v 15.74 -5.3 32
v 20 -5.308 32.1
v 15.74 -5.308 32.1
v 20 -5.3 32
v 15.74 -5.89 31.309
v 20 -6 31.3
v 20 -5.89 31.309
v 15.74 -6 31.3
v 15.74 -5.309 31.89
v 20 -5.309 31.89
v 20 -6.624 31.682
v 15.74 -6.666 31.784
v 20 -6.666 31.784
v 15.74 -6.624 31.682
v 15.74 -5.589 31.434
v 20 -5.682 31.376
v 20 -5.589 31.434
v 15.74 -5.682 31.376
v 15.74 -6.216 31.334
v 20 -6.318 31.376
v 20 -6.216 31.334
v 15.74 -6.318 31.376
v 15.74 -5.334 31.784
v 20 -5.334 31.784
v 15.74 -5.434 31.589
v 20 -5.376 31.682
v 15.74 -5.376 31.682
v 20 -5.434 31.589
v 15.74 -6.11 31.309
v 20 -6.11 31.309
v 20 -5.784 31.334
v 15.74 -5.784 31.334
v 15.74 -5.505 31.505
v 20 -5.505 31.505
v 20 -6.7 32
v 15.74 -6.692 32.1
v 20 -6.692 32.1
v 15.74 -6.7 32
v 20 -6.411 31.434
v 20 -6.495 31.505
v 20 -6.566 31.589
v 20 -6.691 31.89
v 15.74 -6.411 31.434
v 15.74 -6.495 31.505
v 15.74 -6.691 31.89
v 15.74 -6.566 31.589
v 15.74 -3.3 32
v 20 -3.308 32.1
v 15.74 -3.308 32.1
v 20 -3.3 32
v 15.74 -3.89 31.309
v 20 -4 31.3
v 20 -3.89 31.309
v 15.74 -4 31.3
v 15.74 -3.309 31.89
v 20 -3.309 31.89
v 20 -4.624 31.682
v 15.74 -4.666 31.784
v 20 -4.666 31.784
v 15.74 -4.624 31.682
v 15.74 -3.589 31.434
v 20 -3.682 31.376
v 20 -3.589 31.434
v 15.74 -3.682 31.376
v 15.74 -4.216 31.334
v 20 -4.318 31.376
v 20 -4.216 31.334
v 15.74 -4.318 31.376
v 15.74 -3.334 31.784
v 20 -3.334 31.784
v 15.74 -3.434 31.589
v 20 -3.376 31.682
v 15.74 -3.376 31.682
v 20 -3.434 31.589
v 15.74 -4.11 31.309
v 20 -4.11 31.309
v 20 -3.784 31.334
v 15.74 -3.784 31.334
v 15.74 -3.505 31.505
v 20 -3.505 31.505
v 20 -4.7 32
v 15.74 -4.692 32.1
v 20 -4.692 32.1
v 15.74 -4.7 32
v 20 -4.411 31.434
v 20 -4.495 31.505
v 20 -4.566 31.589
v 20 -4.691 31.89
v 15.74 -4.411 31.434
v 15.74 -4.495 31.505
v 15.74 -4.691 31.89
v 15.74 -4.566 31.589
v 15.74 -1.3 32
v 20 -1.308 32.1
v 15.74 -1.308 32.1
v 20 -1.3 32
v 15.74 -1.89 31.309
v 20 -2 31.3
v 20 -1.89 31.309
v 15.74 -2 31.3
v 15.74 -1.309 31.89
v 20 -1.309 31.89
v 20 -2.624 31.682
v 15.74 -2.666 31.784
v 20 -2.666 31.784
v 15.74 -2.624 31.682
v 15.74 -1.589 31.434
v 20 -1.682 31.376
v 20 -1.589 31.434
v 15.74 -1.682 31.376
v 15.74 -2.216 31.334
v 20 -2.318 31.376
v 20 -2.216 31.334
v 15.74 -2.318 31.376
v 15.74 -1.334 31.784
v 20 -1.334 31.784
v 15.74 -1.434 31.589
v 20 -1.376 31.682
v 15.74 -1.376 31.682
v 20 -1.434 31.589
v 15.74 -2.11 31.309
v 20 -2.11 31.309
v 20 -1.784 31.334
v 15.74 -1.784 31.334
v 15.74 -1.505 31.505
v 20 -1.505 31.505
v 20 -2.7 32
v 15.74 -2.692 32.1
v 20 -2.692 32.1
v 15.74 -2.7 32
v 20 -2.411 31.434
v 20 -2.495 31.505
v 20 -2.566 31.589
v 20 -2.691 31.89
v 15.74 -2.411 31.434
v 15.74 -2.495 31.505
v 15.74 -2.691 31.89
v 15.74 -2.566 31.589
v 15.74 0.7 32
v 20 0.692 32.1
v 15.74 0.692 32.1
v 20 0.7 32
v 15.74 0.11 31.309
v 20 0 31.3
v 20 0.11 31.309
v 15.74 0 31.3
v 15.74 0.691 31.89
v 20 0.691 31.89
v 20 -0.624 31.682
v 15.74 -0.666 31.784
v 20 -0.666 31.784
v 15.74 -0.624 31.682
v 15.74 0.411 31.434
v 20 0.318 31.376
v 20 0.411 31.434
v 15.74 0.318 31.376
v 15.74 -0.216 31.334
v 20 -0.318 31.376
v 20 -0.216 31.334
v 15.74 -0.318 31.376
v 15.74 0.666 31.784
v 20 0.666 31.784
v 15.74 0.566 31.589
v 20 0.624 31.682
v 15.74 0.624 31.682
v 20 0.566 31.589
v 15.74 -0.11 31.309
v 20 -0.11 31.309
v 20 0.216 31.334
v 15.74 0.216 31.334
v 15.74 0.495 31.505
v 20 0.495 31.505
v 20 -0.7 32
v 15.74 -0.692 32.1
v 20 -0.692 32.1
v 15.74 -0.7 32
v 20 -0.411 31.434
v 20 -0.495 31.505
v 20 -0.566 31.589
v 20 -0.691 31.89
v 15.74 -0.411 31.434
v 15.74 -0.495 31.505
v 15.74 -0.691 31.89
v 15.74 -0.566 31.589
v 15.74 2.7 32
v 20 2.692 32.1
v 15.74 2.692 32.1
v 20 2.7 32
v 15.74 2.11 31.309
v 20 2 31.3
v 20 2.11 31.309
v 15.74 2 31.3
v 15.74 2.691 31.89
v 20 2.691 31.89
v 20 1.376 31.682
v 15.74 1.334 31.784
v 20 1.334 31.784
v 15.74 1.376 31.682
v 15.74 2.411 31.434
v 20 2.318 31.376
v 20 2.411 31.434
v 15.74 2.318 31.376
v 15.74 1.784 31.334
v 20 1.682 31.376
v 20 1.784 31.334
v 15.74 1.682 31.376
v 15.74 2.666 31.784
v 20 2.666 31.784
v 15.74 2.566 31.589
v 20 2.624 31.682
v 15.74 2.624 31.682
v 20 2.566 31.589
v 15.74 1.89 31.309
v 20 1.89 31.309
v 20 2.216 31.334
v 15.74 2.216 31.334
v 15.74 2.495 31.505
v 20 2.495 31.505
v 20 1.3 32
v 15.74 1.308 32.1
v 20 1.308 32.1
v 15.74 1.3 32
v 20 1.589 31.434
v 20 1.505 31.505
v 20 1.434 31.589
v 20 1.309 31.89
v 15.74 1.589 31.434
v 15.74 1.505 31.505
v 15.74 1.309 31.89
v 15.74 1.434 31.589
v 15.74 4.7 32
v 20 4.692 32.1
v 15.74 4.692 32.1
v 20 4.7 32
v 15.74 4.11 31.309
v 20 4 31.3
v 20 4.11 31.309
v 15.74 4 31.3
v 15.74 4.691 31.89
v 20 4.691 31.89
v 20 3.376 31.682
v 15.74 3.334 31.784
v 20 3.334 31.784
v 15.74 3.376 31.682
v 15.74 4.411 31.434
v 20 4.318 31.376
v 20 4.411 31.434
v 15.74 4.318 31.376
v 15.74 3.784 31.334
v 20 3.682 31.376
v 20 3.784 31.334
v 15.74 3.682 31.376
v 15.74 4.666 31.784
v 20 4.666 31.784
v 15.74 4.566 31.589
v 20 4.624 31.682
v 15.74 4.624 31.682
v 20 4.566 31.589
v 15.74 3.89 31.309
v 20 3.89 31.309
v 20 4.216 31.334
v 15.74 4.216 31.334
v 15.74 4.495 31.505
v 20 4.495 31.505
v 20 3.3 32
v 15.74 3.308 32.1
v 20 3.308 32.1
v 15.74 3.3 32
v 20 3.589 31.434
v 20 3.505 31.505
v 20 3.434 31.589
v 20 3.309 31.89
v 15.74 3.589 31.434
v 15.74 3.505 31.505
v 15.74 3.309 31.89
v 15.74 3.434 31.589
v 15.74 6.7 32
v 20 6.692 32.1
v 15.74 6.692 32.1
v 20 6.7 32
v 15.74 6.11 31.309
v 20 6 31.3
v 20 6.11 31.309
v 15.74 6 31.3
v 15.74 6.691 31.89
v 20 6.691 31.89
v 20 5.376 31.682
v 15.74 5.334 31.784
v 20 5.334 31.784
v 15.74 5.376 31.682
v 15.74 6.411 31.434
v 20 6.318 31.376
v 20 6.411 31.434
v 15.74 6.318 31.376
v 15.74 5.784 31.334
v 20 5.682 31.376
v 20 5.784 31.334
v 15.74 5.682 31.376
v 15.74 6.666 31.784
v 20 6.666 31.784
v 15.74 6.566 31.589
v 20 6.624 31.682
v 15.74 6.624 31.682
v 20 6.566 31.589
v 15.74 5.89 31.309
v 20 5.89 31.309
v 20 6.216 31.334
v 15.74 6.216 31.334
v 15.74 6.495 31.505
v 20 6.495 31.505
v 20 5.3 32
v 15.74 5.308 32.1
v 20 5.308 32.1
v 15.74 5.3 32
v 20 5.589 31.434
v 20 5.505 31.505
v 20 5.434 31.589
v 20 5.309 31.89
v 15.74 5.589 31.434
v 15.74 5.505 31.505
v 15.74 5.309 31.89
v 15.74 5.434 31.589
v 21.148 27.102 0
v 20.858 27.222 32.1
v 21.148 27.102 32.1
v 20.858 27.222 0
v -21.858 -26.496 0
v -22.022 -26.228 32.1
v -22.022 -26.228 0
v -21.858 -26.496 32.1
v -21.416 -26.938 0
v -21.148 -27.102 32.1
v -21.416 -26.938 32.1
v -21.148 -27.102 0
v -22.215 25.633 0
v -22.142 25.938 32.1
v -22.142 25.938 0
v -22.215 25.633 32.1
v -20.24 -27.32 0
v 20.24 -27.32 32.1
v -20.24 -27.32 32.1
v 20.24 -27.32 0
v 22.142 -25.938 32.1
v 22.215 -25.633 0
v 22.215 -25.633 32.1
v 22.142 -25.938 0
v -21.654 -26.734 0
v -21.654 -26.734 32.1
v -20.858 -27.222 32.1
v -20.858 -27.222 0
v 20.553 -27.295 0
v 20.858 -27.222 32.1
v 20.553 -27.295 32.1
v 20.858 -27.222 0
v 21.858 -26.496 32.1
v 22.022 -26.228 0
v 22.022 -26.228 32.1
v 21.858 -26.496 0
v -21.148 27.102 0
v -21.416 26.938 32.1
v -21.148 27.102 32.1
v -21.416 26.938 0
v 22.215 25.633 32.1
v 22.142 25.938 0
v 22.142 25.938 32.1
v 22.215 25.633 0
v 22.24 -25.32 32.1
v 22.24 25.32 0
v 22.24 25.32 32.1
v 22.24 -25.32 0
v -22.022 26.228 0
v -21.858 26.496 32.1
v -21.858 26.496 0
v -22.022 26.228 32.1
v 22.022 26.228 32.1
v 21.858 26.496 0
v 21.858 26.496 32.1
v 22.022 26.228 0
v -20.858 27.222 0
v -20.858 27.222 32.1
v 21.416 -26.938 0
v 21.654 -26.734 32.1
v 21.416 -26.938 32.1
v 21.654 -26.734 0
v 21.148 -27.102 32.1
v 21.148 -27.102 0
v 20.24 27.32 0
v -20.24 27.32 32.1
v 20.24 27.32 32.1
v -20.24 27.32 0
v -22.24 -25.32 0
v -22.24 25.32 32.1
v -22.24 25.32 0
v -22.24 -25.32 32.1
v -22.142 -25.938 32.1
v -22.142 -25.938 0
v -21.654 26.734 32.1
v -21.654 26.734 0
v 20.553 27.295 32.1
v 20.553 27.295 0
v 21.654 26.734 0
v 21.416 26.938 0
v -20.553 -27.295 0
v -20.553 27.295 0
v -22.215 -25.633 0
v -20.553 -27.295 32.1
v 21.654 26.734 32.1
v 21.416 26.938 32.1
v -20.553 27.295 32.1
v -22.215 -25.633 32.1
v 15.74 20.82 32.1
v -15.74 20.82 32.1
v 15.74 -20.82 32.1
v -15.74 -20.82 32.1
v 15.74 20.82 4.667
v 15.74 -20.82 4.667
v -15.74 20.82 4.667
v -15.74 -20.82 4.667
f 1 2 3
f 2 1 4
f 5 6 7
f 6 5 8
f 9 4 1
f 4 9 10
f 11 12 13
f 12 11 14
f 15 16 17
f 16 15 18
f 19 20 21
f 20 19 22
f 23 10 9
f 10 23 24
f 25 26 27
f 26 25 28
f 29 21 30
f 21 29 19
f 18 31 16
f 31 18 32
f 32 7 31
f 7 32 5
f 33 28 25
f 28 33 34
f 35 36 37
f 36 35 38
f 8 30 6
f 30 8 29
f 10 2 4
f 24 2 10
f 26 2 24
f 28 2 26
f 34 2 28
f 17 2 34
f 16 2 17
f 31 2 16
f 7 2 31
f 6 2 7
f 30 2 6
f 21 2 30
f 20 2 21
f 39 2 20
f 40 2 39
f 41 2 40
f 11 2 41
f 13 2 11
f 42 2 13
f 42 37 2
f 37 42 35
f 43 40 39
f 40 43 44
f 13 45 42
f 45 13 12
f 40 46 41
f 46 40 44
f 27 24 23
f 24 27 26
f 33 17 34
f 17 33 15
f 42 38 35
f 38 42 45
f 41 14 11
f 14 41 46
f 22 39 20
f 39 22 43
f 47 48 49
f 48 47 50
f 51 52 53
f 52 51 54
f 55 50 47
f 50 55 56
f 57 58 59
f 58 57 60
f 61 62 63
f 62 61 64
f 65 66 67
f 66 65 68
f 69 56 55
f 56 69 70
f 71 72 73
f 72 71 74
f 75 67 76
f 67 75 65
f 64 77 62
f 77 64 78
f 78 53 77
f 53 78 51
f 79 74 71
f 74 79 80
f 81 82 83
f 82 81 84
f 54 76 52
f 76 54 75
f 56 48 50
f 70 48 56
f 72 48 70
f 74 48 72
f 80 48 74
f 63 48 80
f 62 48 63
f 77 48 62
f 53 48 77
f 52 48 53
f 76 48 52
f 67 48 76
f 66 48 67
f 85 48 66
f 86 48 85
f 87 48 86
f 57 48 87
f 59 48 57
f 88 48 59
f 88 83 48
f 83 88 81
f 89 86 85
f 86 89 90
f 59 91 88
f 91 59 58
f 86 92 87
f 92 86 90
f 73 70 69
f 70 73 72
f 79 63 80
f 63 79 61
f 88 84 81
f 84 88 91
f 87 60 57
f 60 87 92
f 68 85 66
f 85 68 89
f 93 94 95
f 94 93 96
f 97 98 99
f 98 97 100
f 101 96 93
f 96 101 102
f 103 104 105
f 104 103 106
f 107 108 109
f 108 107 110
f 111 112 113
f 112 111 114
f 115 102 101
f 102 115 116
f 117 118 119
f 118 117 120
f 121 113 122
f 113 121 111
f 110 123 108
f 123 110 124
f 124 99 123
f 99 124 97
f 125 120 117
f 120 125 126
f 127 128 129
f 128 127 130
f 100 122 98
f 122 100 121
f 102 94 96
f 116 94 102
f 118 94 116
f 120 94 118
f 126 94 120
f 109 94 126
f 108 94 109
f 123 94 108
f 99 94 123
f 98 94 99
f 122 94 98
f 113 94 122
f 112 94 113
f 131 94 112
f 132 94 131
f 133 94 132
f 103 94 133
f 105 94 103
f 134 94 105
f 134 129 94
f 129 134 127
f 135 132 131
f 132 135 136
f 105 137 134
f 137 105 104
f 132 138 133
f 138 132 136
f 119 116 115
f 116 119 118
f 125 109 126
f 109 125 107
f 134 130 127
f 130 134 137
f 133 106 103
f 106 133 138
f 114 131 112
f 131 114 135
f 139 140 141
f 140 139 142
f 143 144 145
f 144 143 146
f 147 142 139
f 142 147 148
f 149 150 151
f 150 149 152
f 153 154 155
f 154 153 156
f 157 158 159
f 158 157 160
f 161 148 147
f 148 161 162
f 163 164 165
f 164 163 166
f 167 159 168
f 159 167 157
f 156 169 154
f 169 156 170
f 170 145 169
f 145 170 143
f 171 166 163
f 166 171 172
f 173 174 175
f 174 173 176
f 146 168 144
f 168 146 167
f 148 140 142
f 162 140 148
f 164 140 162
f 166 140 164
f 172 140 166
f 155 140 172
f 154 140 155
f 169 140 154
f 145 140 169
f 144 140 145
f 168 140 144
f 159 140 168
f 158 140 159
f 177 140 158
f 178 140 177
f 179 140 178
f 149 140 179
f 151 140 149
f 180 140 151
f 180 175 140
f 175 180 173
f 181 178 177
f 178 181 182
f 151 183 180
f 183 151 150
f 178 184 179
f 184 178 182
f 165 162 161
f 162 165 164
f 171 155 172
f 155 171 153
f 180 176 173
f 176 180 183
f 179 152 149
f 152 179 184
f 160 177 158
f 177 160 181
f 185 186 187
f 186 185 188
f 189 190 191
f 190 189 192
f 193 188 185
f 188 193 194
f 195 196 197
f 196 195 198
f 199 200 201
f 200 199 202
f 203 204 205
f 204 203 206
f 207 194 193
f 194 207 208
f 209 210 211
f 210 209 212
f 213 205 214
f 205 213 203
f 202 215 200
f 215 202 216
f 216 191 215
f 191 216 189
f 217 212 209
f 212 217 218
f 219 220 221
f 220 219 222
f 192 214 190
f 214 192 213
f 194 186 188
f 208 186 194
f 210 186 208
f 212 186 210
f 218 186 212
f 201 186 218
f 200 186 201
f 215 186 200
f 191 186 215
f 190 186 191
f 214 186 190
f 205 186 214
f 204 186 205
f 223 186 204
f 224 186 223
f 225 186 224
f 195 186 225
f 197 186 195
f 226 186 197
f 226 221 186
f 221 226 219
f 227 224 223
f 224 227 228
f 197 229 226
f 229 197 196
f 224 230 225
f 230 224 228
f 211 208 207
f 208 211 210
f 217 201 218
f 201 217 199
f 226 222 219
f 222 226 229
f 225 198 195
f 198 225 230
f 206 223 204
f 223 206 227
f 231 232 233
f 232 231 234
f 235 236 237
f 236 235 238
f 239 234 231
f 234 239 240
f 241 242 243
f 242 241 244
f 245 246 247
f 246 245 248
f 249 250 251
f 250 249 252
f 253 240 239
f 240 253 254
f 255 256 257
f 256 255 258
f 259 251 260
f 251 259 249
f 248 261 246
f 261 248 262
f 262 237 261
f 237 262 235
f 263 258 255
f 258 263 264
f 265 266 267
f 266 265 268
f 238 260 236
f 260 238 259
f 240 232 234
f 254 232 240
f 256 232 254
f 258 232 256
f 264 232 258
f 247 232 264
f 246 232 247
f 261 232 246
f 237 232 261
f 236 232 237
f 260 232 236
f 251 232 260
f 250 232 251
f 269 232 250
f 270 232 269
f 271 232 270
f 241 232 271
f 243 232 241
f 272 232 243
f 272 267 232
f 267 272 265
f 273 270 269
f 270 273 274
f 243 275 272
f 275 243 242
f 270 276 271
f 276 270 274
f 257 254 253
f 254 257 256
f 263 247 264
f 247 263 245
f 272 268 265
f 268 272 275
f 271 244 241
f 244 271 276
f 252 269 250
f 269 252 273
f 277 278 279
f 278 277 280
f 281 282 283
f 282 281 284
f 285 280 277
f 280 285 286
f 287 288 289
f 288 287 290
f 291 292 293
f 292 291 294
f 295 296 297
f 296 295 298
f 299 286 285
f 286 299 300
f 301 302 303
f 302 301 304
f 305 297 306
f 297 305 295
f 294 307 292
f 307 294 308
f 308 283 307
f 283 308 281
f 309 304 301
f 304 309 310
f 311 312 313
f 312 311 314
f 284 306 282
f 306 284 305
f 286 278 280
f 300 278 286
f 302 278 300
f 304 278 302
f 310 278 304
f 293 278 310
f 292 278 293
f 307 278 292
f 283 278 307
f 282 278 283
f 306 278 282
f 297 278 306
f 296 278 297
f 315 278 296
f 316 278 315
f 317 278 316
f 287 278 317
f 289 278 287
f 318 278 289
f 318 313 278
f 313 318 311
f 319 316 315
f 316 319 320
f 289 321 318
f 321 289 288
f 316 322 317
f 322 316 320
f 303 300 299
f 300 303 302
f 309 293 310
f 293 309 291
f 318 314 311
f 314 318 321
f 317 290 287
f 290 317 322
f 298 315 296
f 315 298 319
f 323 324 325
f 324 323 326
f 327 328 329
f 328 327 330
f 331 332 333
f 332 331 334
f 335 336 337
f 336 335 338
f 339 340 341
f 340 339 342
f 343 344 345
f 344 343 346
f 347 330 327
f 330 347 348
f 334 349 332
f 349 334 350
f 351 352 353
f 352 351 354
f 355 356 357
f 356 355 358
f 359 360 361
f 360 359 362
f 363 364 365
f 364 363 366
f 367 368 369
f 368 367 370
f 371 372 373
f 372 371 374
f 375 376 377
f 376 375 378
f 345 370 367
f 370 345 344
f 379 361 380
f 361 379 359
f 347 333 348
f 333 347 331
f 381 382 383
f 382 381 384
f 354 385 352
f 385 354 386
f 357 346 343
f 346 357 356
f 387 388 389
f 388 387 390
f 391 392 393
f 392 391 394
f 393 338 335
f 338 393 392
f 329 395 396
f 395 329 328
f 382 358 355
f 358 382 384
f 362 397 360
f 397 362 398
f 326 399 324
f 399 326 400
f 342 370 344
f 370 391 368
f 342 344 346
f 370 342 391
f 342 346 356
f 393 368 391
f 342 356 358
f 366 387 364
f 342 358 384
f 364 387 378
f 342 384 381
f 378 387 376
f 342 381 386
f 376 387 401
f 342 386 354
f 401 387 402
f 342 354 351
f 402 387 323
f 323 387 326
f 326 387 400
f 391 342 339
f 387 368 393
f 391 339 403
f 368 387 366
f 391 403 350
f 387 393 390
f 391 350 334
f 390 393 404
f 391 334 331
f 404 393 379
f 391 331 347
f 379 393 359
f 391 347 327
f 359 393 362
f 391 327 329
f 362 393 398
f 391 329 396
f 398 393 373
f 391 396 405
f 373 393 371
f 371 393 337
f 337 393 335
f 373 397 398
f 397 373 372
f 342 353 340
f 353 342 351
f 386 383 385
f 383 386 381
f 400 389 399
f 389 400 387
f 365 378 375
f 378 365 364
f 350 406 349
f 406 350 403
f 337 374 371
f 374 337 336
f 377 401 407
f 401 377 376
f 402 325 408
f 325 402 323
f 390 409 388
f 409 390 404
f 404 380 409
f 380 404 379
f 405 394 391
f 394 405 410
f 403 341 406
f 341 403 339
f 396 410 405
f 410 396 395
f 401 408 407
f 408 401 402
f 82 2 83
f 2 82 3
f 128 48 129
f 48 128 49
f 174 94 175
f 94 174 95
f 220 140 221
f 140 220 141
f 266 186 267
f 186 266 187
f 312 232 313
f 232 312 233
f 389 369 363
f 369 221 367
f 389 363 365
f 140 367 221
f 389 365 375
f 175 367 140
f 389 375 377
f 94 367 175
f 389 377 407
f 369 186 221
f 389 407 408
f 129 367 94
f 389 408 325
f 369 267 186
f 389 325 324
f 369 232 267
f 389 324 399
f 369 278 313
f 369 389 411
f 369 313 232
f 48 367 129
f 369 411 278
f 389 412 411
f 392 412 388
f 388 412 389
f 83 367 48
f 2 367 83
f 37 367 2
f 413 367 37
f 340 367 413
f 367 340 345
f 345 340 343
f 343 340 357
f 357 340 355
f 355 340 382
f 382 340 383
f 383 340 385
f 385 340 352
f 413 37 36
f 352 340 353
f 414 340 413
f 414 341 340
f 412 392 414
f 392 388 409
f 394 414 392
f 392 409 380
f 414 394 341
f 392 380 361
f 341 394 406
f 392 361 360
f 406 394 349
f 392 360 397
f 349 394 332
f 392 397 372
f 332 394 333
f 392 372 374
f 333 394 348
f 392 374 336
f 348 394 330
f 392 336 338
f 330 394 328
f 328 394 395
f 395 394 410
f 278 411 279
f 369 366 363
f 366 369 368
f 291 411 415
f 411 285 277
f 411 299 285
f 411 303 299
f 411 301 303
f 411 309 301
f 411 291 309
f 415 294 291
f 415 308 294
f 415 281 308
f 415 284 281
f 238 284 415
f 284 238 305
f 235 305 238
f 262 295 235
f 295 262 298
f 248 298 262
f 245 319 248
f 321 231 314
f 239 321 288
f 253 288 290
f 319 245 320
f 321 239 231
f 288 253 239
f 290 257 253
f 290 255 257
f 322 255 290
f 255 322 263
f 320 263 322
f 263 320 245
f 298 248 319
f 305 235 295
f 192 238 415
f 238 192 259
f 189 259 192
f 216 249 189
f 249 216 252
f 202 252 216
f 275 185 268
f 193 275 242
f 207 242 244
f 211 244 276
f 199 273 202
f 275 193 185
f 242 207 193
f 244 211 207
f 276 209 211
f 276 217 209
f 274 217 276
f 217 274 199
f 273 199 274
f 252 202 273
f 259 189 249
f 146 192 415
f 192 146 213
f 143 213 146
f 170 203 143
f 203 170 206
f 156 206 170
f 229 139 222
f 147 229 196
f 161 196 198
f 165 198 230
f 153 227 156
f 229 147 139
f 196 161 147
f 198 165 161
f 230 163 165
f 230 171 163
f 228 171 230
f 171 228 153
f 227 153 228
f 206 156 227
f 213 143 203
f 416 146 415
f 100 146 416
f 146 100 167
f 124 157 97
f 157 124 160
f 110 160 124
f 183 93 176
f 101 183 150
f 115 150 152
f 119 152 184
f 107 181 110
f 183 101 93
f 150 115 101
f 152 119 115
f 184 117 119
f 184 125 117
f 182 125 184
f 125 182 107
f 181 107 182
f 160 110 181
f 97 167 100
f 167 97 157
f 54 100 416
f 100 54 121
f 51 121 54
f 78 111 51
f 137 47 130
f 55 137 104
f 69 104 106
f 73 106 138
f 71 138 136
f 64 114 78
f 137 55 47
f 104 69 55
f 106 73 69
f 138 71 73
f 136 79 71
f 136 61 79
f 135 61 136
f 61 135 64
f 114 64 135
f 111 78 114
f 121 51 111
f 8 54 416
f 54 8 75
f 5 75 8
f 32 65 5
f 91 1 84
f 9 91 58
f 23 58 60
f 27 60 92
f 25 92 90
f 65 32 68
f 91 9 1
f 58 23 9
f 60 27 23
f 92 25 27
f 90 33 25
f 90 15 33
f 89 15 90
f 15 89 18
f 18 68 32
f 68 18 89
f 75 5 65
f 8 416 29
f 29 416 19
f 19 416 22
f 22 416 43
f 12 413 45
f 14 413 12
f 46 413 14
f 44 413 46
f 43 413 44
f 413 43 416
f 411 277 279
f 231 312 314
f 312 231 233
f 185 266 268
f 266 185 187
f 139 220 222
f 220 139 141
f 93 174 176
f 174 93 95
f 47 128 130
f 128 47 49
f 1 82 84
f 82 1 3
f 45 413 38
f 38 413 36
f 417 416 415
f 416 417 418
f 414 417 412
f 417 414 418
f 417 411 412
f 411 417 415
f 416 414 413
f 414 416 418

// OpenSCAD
// file: ../configuration.scad
$fn=40; // model faces resolution.

//OBECNE PARAMETRY 
//----------------------------------------------------------------
//----------------------------------------------------------------

vyska_krystalu=15;
vyska_sipm=2;
presah_krystalu=6;
rezerva_nad_krystalem=5;
vyska_drzaku_krystalu=vyska_krystalu-presah_krystalu-2;

hrana_krystalu=6; //čistá hrana

// big-big
//zakladna_krystalu_x=23.7; //1.5mm rezerva hrana SIPM je 22 mm
//zakladna_krystalu_y=23.7;
// big-small
zakladna_krystalu_x=22.0; //1.5mm rezerva hrana SIPM je 22 mm
zakladna_krystalu_y=22.0;
sila_steny=1.2;
sila_materialu_zakladny=7; //1.6;


vyska_zapusti_pro_PCB=0; //výčka krycího matriálu pro PCB a zároveň pro vytvoření vany pro zalití silikonem, kvůli světlotěsnoti.
vyska_SIPM_nad_PCB=2.4; //výška celého SIPM senzoru
tolerance_pro_dotazeni_k_SIPM=-0.5; // kvůli dotažení krystalu k SIPM
velikost_modulu_x=2; //počet der
velikost_modulu_y=4;
rotec_der_modulu=10.16;

vyska_matky=3;
sirka_matky=6.7;
prumer_sroubu=3.6;//3.4;
prumer_hlavy_sroubu=6;
vyska_hlavy_sroubu=5;

//Pro díl SIPMBOX01C_D02
D02_velikost_modulu_x=3; //počet der
D02_velikost_modulu_y=4;
D02_vyska_bocniho_prekryvu=25;

//Pro díl SIPMBOX01C_D07
D07_vyska=6;
// main file
include <../configuration.scad>
 
/*
difference (){
SIPMBOX01C_D05();
 
translate([-(hrana_krystalu)/2,-(hrana_krystalu)/2,0])
         
   cube([100,100,100]);   
    
}
*/

/*
difference (){
      union() {
translate([0,0,7])
          
          translate([-rotec_der_modulu/2,0,0])
          SIPMBOX01C_D01();
          
         
SIPMBOX01C_D02();

translate([-rotec_der_modulu/2,0,0])
SIPMBOX01C_D06();


SIPMBOX01C_D07();
 
 
translate([-10/2,-(D02_velikost_modulu_y+2)*rotec_der_modulu/2,sila_materialu_zakladny+vyska_krystalu+rezerva_nad_krystalem])          
SIPMBOX01C_D08();          
          

translate([-rotec_der_modulu/2,0,0])
SIPMBOX01C_D03();

translate([-(hrana_krystalu)/2,-(hrana_krystalu)/2,0])
cube([hrana_krystalu,hrana_krystalu,vyska_krystalu+vyska_sipm]);
          }
   cube([100,100,100]);       
          
          }

//*/



// SIPMBOX01C_D01();

//SIPMBOX01C_D06();

SIPMBOX01C_D02();


 

module SIPMBOX01C_D08()
{
  vyska_sloupku=3;
   difference () 
    {
   union()       {   
    cube([10,(D02_velikost_modulu_y+2)*rotec_der_modulu,2],center=false); 
        translate([10/2,0,0]) 
        cylinder (h = 3, r= 10/2, $fn=20);
        
     translate([10/2,(D02_velikost_modulu_y+2)*rotec_der_modulu,0]) 
        cylinder (h = 3, r= 10/2, $fn=20);
    }
    
     translate([10/2,0,-0.01]) 
            cylinder (h = vyska_sloupku+1, r= (prumer_sroubu+0.2)/2, $fn=40);
    
     translate([10/2,(D02_velikost_modulu_y+2)*rotec_der_modulu,-0.01]) 
            cylinder (h = vyska_sloupku+1, r= (prumer_sroubu+0.2)/2, $fn=40);
    
    
    }
    
    
       
}





module SIPMBOX01C_D07() //drzak na ALBASE
{
  difference (){
      union() {
 //Zakladna
 translate([-((D02_velikost_modulu_x) * rotec_der_modulu+2*sila_materialu_zakladny)/2,-((D02_velikost_modulu_y+2) * rotec_der_modulu+2*sila_materialu_zakladny)/2,0])
 
 minkowski()
{
  cube([(D02_velikost_modulu_x) * rotec_der_modulu+2*sila_materialu_zakladny,(D02_velikost_modulu_y+2) * rotec_der_modulu+2*sila_materialu_zakladny,D07_vyska]);
  cylinder(r=2,h=0.1);
}







}

//otvor na cely scintilacni detektor 
translate([-(D02_velikost_modulu_x * rotec_der_modulu+2*sila_materialu_zakladny)/2+2-1,-(D02_velikost_modulu_y * rotec_der_modulu+2*sila_materialu_zakladny)/2+2-1,0])
 
 minkowski()
{
  cube([D02_velikost_modulu_x * rotec_der_modulu-2*2+2+2*sila_materialu_zakladny,D02_velikost_modulu_y * rotec_der_modulu-2*2+2+2*sila_materialu_zakladny,D07_vyska]);
  cylinder(r=2,h=0.1);
}


//otvor na sroub 1
translate([-(D02_velikost_modulu_x-1)*rotec_der_modulu/2,(D02_velikost_modulu_y+2)*rotec_der_modulu/2,-0.01]) 
    translate([0,0,-0.01]) 
        {
        cylinder (h = D07_vyska+0.12, r= (prumer_sroubu+0.2)/2, $fn=40);
    
        cylinder (h = vyska_matky, r= (sirka_matky+0.2)/2, $fn=6);
      
        }

//otvor na sroub 2
translate([(D02_velikost_modulu_x-1)*rotec_der_modulu/2,(D02_velikost_modulu_y+2)*rotec_der_modulu/2,-0.01]) 
    translate([0,0,-0.01]) 
        {
        cylinder (h = D07_vyska+0.12, r= (prumer_sroubu+0.2)/2, $fn=40);
    
        cylinder (h = vyska_matky, r= (sirka_matky+0.2)/2, $fn=6);
      
        }

//otvor na sroub 3
translate([-(D02_velikost_modulu_x-1)*rotec_der_modulu/2,-(D02_velikost_modulu_y+2)*rotec_der_modulu/2,-0.01]) 
    translate([0,0,-0.01]) 
        {
        cylinder (h = D07_vyska+0.12, r= (prumer_sroubu+0.2)/2, $fn=40);
    
        cylinder (h = vyska_matky, r= (sirka_matky+0.2)/2, $fn=6);
      
        }

//otvor na sroub 4
translate([(D02_velikost_modulu_x-1)*rotec_der_modulu/2,-(D02_velikost_modulu_y+2)*rotec_der_modulu/2,-0.01]) 
    translate([0,0,-0.01]) 
        {
        cylinder (h = D07_vyska+0.12, r= (prumer_sroubu+0.2)/2, $fn=40);
    
        cylinder (h = vyska_matky, r= (sirka_matky+0.2)/2, $fn=6);
      
        }
 
//Otvor na uchytny sroub 1
translate([0,(D02_velikost_modulu_y+2)*rotec_der_modulu/2,0]) 
    translate([0,0,-0.01]) 
        {
        cylinder (h = D07_vyska+0.12, r= (prumer_sroubu+0.2)/2, $fn=40);
         cylinder (h = vyska_hlavy_sroubu, r= (prumer_hlavy_sroubu+0.2)/2, $fn=40);
                      
        }

//Otvor na uchytny sroub 2
translate([0,-(D02_velikost_modulu_y+2)*rotec_der_modulu/2,-0.01]) 
    translate([0,0,-0.01]) 
        {
        cylinder (h = D07_vyska+0.12, r= (prumer_sroubu+0.2)/2, $fn=40);
   cylinder (h = vyska_hlavy_sroubu, r= (prumer_hlavy_sroubu+0.2)/2, $fn=40);
        }      
        
 
} 
}           
         

module SIPMBOX01C_D05() //drzak krystalu
{
  difference (){
      union() {
 //Zakladna
 translate([-(velikost_modulu_x * rotec_der_modulu)/2+2+1/2,-(velikost_modulu_y * rotec_der_modulu)/2+2+1/2,0])
 
 minkowski()
{
  cube([velikost_modulu_x * rotec_der_modulu-2*2-1,velikost_modulu_y * rotec_der_modulu-2*2-1,sila_materialu_zakladny]);
  cylinder(r=2,h=0.1);
}


//drzak krystalu
 translate([-(zakladna_krystalu_x+4*sila_steny)/2+2,-(zakladna_krystalu_y+4*sila_steny)/2+2,0])
 
 minkowski()
{
  cube([zakladna_krystalu_x-2*2+4*sila_steny,zakladna_krystalu_y-2*2+4*sila_steny,vyska_drzaku_krystalu+1.5]);
  cylinder(r=2,h=0.1);
}
}

//otvor pro dilec 01D
 translate([-(zakladna_krystalu_x+2*sila_steny+1.5)/2+2,-(zakladna_krystalu_y+2*sila_steny+1.5)/2+2,0])
 
 minkowski()
{
  cube([zakladna_krystalu_x-2*2+2*sila_steny+1.5,zakladna_krystalu_y-2*2+2*sila_steny+1.5,vyska_drzaku_krystalu]);
  cylinder(r=2,h=0.1);
}


//otvor na sroub 1
translate([(velikost_modulu_x-1)*rotec_der_modulu/2,(velikost_modulu_y-1)*rotec_der_modulu/2,-0.01]) 
 
 translate([0,0,-0.01]) 
        cylinder (h = sila_materialu_zakladny+0.12, r= (prumer_sroubu+0.2)/2, $fn=40);


 //otvor na sroub 2
    translate([-(velikost_modulu_x-1)*rotec_der_modulu/2,(velikost_modulu_y-1)*rotec_der_modulu/2,-0.01]) 
      translate([0,0,-0.01]) 
        cylinder (h = sila_materialu_zakladny+0.12, r= (prumer_sroubu+0.2)/2, $fn=40);

    //otvor na sroub 3
    translate([(velikost_modulu_x-1)*rotec_der_modulu/2,-(velikost_modulu_y-1)*rotec_der_modulu/2,-0.01]) 
      translate([0,0,-0.01]) 
        cylinder (h = sila_materialu_zakladny+0.12, r= (prumer_sroubu+0.2)/2, $fn=40);
//otvor na sroub 4
    translate([-(velikost_modulu_x-1)*rotec_der_modulu/2,-(velikost_modulu_y-1)*rotec_der_modulu/2,-0.01]) 
      translate([0,0,-0.01]) 
        cylinder (h = sila_materialu_zakladny+0.12, r= (prumer_sroubu+0.2)/2, $fn=40);
 
 
 //otvor na krystal
 
 translate([-(zakladna_krystalu_x)/2,-(zakladna_krystalu_y)/2,0])
 cube([zakladna_krystalu_x,zakladna_krystalu_y,vyska_drzaku_krystalu+0.12]);
} 
} 



module SIPMBOX01C_D03() //vrchní kryt
{
  difference (){
      union() {
 //Zakladna
 translate([-(velikost_modulu_x * rotec_der_modulu+2*sila_materialu_zakladny)/2+2,-(velikost_modulu_y * rotec_der_modulu+2*sila_materialu_zakladny)/2+2,0])
 
 minkowski()
{
  cube([velikost_modulu_x * rotec_der_modulu-2*2+2*sila_materialu_zakladny,velikost_modulu_y * rotec_der_modulu-2*2+2*sila_materialu_zakladny,sila_materialu_zakladny+vyska_krystalu+rezerva_nad_krystalem]);
  cylinder(r=2,h=0.1);
}


}

//odstranění vnitřního prostoru ve tvaru krychle
 translate([-(velikost_modulu_x * rotec_der_modulu)/2,-(velikost_modulu_y * rotec_der_modulu)/2,sila_materialu_zakladny])
cube([velikost_modulu_x * rotec_der_modulu,velikost_modulu_y * rotec_der_modulu,sila_materialu_zakladny+vyska_krystalu+rezerva_nad_krystalem]);


 
} 
} 

module SIPMBOX01C_D02() //kryt ze spoda
{
  difference (){
      union() {
 //Zakladna
 translate([-(D02_velikost_modulu_x * rotec_der_modulu+2*sila_materialu_zakladny)/2+2,-(D02_velikost_modulu_y * rotec_der_modulu+2*sila_materialu_zakladny)/2+2,0])
 
 minkowski()
{
  cube([D02_velikost_modulu_x * rotec_der_modulu-2*2+2*sila_materialu_zakladny,D02_velikost_modulu_y * rotec_der_modulu-2*2+2*sila_materialu_zakladny,sila_materialu_zakladny+D02_vyska_bocniho_prekryvu]);
  cylinder(r=2,h=0.1);
}



}

 translate([-(D02_velikost_modulu_x * rotec_der_modulu)/2-1/2,-(D02_velikost_modulu_y * rotec_der_modulu)/2-1/2,sila_materialu_zakladny/3*2])
#cube([D02_velikost_modulu_x * rotec_der_modulu+1,D02_velikost_modulu_y * rotec_der_modulu+1,sila_materialu_zakladny+D02_vyska_bocniho_prekryvu]);
for(i=[0:2:12]) 
  translate([0,i-12/2,sila_materialu_zakladny+D02_vyska_bocniho_prekryvu]) rotate([90,0,90]) cylinder(r=0.7,h=20);

} 
} 
 
 module SIPMBOX01C_D01() //drzak krystalu
{
  difference (){
      union() {
 //Zakladna
 translate([-(velikost_modulu_x * rotec_der_modulu)/2+2+1/2,-(velikost_modulu_y * rotec_der_modulu)/2+2+1/2,0])
 
 minkowski()
{
  cube([velikost_modulu_x * rotec_der_modulu-2*2-1,velikost_modulu_y * rotec_der_modulu-2*2-1,sila_materialu_zakladny]);
  cylinder(r=2,h=0.1);
}


//drzak krystalu
 translate([-(zakladna_krystalu_x+2*sila_steny)/2+2,-(zakladna_krystalu_y+2*sila_steny)/2+2,0])
 
 minkowski()
{
  cube([zakladna_krystalu_x-2*2+2*sila_steny,zakladna_krystalu_y-2*2+2*sila_steny,vyska_drzaku_krystalu]);
  cylinder(r=2,h=0.1);
}
}
//otvor na sroub 1
translate([(velikost_modulu_x-1)*rotec_der_modulu/2,(velikost_modulu_y-1)*rotec_der_modulu/2,-0.01]) 
 
 translate([0,0,-0.01]) 
        cylinder (h = sila_materialu_zakladny+0.12, r= (prumer_sroubu+0.2)/2, $fn=40);


 //otvor na sroub 2
    translate([-(velikost_modulu_x-1)*rotec_der_modulu/2,(velikost_modulu_y-1)*rotec_der_modulu/2,-0.01]) 
      translate([0,0,-0.01]) 
        cylinder (h = sila_materialu_zakladny+0.12, r= (prumer_sroubu+0.2)/2, $fn=40);

    //otvor na sroub 3
    translate([(velikost_modulu_x-1)*rotec_der_modulu/2,-(velikost_modulu_y-1)*rotec_der_modulu/2,-0.01]) 
      translate([0,0,-0.01]) 
        cylinder (h = sila_materialu_zakladny+0.12, r= (prumer_sroubu+0.2)/2, $fn=40);
//otvor na sroub 4
    translate([-(velikost_modulu_x-1)*rotec_der_modulu/2,-(velikost_modulu_y-1)*rotec_der_modulu/2,-0.01]) 
      translate([0,0,-0.01]) 
        cylinder (h = sila_materialu_zakladny+0.12, r= (prumer_sroubu+0.2)/2, $fn=40);
 
 
 //otvor na krystal
 
 //translate([-(zakladna_krystalu_x)/2,-(zakladna_krystalu_y)/2,-sila_steny])
 translate([0,0,-2])
 cylinder (h = vyska_drzaku_krystalu+0.12, r= zakladna_krystalu_x/2, $fn=60);
//#cube([zakladna_krystalu_x,zakladna_krystalu_y,vyska_drzaku_krystalu+0.12]);
} 
} 

module SIPMBOX01C_D06() //drzak krystalu
{
  difference (){
      union() {
 //Zakladna
 translate([-(velikost_modulu_x * rotec_der_modulu)/2+2+1/2,-(velikost_modulu_y * rotec_der_modulu)/2+2+1/2,0])
 
 minkowski()
{
  cube([velikost_modulu_x * rotec_der_modulu-2*2-1,velikost_modulu_y * rotec_der_modulu-2*2-1,sila_materialu_zakladny]);
  cylinder(r=2,h=0.1);
}


//drzak krystalu
 translate([-(zakladna_krystalu_x+2*sila_steny)/2+2,-(zakladna_krystalu_y+2*sila_steny)/2+2,0])
 
 minkowski()
{
  cube([zakladna_krystalu_x-2*2+2*sila_steny,zakladna_krystalu_y-2*2+2*sila_steny,4]);
  cylinder(r=2,h=0.1);
}
}
//otvor na sroub 1
translate([(velikost_modulu_x-1)*rotec_der_modulu/2,(velikost_modulu_y-1)*rotec_der_modulu/2,-0.01]) 
 
 translate([0,0,-0.01]) 
        cylinder (h = sila_materialu_zakladny+0.12, r= (prumer_sroubu+0.2)/2, $fn=40);


 //otvor na sroub 2
    translate([-(velikost_modulu_x-1)*rotec_der_modulu/2,(velikost_modulu_y-1)*rotec_der_modulu/2,-0.01]) 
      translate([0,0,-0.01]) 
        cylinder (h = sila_materialu_zakladny+0.12, r= (prumer_sroubu+0.2)/2, $fn=40);

    //otvor na sroub 3
    translate([(velikost_modulu_x-1)*rotec_der_modulu/2,-(velikost_modulu_y-1)*rotec_der_modulu/2,-0.01]) 
      translate([0,0,-0.01]) 
        cylinder (h = sila_materialu_zakladny+0.12, r= (prumer_sroubu+0.2)/2, $fn=40);
//otvor na sroub 4
    translate([-(velikost_modulu_x-1)*rotec_der_modulu/2,-(velikost_modulu_y-1)*rotec_der_modulu/2,-0.01]) 
      translate([0,0,-0.01]) 
        cylinder (h = sila_materialu_zakladny+0.12, r= (prumer_sroubu+0.2)/2, $fn=40);
 
 
 //otvor na krystal
 
 translate([0,0,-2])
 cylinder (h = vyska_drzaku_krystalu+0.12, r= zakladna_krystalu_x/2, $fn=60);

// translate([-(zakladna_krystalu_x)/2,-(zakladna_krystalu_y)/2,-sila_steny])
// cube([zakladna_krystalu_x,zakladna_krystalu_y,vyska_drzaku_krystalu+0.12]);
} 
}  
